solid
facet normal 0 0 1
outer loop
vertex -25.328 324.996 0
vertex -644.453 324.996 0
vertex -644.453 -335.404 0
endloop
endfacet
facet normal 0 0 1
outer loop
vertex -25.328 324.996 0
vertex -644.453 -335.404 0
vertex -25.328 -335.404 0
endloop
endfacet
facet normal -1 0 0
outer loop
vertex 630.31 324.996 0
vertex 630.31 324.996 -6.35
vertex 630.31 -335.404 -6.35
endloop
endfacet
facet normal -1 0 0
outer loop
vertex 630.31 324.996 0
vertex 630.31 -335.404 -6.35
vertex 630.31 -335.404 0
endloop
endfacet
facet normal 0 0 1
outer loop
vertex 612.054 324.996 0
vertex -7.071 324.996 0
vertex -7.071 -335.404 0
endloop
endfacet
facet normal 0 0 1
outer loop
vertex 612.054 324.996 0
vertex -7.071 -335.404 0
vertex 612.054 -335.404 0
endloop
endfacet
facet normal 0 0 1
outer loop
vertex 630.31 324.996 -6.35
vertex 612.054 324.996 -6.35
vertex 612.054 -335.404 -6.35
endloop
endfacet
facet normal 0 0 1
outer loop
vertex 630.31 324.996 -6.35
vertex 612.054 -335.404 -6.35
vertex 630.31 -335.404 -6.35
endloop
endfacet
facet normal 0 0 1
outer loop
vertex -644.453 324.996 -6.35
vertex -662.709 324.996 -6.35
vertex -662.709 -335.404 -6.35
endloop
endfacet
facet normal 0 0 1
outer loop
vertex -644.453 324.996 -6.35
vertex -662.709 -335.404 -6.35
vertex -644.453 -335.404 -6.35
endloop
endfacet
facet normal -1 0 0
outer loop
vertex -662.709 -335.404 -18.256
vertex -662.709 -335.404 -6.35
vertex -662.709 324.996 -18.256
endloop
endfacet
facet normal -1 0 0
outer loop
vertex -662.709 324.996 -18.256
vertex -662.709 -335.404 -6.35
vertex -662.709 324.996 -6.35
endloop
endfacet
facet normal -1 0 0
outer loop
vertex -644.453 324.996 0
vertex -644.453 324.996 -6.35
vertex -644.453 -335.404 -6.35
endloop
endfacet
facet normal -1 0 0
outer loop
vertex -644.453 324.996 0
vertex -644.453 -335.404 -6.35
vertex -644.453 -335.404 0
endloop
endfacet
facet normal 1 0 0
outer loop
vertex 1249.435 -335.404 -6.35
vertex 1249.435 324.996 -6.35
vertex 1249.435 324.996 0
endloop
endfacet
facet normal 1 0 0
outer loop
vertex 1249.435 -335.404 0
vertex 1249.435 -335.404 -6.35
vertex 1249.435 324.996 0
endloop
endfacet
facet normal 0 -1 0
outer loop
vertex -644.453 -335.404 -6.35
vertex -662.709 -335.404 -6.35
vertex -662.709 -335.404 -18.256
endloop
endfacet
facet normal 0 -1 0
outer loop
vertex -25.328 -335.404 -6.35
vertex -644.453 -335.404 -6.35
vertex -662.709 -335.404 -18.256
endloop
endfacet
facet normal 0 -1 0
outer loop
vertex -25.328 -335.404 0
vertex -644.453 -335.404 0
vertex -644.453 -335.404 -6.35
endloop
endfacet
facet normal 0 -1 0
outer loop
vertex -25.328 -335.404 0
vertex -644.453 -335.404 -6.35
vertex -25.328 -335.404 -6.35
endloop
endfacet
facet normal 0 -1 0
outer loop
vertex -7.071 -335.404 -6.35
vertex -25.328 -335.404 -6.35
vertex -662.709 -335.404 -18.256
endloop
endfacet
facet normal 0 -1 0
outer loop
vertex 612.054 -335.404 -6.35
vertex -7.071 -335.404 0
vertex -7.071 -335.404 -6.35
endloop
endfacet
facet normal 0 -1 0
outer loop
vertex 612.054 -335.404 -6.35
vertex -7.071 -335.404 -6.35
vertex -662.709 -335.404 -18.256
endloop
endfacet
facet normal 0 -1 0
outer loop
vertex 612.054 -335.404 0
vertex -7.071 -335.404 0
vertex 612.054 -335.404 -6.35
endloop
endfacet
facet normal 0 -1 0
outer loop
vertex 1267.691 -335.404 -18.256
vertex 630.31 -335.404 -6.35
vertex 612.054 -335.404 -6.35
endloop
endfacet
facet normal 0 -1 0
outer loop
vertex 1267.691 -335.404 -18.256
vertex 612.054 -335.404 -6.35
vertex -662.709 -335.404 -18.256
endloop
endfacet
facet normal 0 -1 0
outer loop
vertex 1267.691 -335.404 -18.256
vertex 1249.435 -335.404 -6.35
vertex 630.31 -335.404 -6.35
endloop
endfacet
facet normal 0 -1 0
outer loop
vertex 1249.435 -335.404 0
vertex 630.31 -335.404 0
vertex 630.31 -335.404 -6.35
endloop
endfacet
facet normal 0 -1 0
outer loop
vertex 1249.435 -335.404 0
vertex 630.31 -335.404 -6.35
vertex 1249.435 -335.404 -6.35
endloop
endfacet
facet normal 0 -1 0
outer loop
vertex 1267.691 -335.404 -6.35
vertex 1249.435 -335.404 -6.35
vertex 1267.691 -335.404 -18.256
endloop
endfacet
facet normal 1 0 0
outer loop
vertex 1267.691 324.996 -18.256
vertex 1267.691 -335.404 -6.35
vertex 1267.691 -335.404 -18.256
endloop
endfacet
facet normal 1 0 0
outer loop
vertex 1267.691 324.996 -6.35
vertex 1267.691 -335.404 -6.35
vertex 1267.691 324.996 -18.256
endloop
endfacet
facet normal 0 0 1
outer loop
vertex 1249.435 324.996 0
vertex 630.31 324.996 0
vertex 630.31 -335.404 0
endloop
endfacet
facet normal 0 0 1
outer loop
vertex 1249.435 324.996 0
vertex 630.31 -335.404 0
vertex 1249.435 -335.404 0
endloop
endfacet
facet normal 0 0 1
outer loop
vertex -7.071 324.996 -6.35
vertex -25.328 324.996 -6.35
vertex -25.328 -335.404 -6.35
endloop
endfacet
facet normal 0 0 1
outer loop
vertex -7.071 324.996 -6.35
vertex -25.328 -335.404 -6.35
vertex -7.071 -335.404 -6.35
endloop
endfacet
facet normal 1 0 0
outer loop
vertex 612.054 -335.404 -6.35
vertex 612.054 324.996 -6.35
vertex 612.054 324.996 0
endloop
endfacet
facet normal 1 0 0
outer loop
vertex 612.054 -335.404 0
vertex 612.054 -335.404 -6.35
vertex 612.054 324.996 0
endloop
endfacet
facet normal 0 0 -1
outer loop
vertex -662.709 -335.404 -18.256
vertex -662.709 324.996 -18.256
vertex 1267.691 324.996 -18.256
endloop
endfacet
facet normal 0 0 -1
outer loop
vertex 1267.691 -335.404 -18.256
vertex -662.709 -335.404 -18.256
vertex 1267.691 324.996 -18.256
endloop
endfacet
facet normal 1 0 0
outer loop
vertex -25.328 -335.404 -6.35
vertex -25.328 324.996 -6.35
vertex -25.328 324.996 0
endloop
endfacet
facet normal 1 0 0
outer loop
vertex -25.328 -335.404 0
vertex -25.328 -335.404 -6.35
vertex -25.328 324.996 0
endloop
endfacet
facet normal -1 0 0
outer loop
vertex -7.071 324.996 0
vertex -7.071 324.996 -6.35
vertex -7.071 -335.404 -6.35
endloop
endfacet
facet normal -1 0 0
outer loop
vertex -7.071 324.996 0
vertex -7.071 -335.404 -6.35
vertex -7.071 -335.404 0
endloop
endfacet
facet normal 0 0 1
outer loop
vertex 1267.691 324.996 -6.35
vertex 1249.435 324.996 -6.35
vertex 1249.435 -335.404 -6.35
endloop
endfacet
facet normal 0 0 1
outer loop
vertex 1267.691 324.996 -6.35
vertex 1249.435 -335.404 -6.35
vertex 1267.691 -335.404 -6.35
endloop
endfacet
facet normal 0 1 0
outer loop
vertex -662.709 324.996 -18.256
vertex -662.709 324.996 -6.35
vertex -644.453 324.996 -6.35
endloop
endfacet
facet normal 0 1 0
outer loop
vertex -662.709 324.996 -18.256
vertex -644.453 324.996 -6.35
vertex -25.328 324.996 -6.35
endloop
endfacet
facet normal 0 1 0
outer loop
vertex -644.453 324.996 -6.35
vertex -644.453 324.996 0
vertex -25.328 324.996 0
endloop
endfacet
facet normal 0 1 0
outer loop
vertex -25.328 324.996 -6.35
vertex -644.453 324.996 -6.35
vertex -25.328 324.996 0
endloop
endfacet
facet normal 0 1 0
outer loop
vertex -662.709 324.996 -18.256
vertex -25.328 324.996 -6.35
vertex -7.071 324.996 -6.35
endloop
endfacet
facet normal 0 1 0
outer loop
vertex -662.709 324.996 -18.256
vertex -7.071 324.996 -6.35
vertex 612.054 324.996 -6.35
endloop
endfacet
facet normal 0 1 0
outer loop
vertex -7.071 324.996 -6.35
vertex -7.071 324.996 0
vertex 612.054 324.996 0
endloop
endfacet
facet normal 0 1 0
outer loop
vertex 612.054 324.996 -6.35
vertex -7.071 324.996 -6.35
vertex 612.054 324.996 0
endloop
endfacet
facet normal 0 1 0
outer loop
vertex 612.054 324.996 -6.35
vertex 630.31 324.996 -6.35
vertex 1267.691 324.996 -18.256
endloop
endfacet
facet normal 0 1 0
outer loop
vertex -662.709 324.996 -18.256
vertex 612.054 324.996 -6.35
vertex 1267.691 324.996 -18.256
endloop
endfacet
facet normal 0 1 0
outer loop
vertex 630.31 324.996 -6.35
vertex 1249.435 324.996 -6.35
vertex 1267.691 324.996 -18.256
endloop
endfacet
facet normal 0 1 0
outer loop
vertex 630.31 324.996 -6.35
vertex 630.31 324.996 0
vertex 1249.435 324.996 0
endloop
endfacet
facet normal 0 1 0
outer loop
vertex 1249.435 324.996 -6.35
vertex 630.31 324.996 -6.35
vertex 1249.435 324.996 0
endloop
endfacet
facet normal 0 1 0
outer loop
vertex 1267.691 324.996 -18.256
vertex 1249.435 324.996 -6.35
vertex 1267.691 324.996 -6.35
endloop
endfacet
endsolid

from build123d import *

# Parameters (mm, degrees)
F0_W     = 1930.4
F0_H     = 660.4
F1_DEPTH = 18.25625
F2_W     = 18.25625
F2_H     = 6.35
F3_DEPTH = 660.401
F4_W     = 18.25625
F4_H     = 6.35
F5_DEPTH = 660.401
F6_W     = 18.25625
F6_H     = 6.35
F7_DEPTH = 660.401
F8_W     = 18.25625
F8_H     = 6.35
F9_DEPTH = 660.401


# Not quite as in the source:
# - a length typed as a fraction of an inch, garbled in the dataset ("3 / 203.2 mm" for 3/8 in), is restored


with BuildPart() as f1:
    # F0 (on Top) → F1 (new body)
    with BuildSketch(Plane.XY):
        with Locations((302.4911884634, -5.2036456764)):
            Rectangle(F0_W, F0_H)
    extrude(amount=-F1_DEPTH)

    # F2 (on face) → F3 (cut, through all)
    with BuildSketch(Plane.XZ.offset(335.4036456764)):
        with Locations((-653.5806865366, -3.175)):
            Rectangle(F2_W, F2_H)
    extrude(amount=-F3_DEPTH, mode=Mode.SUBTRACT)

    # F4 (on face) → F5 (cut, through all)
    with BuildSketch(Plane.XZ.offset(335.4036456764)):
        with Locations((1258.5630634634, -3.175)):
            Rectangle(F4_W, F4_H)
    extrude(amount=-F5_DEPTH, mode=Mode.SUBTRACT)

    # F6 (on face) → F7 (cut, through all)
    with BuildSketch(Plane.XZ.offset(335.4036456764)):
        with Locations((621.1818134634, -3.175)):
            Rectangle(F6_W, F6_H)
    extrude(amount=-F7_DEPTH, mode=Mode.SUBTRACT)

    # F8 (on face) → F9 (cut, through all)
    with BuildSketch(Plane.XZ.offset(335.4036456764)):
        with Locations((-16.1994365366, -3.175)):
            Rectangle(F8_W, F8_H)
    extrude(amount=-F9_DEPTH, mode=Mode.SUBTRACT)


solid = f1.part
